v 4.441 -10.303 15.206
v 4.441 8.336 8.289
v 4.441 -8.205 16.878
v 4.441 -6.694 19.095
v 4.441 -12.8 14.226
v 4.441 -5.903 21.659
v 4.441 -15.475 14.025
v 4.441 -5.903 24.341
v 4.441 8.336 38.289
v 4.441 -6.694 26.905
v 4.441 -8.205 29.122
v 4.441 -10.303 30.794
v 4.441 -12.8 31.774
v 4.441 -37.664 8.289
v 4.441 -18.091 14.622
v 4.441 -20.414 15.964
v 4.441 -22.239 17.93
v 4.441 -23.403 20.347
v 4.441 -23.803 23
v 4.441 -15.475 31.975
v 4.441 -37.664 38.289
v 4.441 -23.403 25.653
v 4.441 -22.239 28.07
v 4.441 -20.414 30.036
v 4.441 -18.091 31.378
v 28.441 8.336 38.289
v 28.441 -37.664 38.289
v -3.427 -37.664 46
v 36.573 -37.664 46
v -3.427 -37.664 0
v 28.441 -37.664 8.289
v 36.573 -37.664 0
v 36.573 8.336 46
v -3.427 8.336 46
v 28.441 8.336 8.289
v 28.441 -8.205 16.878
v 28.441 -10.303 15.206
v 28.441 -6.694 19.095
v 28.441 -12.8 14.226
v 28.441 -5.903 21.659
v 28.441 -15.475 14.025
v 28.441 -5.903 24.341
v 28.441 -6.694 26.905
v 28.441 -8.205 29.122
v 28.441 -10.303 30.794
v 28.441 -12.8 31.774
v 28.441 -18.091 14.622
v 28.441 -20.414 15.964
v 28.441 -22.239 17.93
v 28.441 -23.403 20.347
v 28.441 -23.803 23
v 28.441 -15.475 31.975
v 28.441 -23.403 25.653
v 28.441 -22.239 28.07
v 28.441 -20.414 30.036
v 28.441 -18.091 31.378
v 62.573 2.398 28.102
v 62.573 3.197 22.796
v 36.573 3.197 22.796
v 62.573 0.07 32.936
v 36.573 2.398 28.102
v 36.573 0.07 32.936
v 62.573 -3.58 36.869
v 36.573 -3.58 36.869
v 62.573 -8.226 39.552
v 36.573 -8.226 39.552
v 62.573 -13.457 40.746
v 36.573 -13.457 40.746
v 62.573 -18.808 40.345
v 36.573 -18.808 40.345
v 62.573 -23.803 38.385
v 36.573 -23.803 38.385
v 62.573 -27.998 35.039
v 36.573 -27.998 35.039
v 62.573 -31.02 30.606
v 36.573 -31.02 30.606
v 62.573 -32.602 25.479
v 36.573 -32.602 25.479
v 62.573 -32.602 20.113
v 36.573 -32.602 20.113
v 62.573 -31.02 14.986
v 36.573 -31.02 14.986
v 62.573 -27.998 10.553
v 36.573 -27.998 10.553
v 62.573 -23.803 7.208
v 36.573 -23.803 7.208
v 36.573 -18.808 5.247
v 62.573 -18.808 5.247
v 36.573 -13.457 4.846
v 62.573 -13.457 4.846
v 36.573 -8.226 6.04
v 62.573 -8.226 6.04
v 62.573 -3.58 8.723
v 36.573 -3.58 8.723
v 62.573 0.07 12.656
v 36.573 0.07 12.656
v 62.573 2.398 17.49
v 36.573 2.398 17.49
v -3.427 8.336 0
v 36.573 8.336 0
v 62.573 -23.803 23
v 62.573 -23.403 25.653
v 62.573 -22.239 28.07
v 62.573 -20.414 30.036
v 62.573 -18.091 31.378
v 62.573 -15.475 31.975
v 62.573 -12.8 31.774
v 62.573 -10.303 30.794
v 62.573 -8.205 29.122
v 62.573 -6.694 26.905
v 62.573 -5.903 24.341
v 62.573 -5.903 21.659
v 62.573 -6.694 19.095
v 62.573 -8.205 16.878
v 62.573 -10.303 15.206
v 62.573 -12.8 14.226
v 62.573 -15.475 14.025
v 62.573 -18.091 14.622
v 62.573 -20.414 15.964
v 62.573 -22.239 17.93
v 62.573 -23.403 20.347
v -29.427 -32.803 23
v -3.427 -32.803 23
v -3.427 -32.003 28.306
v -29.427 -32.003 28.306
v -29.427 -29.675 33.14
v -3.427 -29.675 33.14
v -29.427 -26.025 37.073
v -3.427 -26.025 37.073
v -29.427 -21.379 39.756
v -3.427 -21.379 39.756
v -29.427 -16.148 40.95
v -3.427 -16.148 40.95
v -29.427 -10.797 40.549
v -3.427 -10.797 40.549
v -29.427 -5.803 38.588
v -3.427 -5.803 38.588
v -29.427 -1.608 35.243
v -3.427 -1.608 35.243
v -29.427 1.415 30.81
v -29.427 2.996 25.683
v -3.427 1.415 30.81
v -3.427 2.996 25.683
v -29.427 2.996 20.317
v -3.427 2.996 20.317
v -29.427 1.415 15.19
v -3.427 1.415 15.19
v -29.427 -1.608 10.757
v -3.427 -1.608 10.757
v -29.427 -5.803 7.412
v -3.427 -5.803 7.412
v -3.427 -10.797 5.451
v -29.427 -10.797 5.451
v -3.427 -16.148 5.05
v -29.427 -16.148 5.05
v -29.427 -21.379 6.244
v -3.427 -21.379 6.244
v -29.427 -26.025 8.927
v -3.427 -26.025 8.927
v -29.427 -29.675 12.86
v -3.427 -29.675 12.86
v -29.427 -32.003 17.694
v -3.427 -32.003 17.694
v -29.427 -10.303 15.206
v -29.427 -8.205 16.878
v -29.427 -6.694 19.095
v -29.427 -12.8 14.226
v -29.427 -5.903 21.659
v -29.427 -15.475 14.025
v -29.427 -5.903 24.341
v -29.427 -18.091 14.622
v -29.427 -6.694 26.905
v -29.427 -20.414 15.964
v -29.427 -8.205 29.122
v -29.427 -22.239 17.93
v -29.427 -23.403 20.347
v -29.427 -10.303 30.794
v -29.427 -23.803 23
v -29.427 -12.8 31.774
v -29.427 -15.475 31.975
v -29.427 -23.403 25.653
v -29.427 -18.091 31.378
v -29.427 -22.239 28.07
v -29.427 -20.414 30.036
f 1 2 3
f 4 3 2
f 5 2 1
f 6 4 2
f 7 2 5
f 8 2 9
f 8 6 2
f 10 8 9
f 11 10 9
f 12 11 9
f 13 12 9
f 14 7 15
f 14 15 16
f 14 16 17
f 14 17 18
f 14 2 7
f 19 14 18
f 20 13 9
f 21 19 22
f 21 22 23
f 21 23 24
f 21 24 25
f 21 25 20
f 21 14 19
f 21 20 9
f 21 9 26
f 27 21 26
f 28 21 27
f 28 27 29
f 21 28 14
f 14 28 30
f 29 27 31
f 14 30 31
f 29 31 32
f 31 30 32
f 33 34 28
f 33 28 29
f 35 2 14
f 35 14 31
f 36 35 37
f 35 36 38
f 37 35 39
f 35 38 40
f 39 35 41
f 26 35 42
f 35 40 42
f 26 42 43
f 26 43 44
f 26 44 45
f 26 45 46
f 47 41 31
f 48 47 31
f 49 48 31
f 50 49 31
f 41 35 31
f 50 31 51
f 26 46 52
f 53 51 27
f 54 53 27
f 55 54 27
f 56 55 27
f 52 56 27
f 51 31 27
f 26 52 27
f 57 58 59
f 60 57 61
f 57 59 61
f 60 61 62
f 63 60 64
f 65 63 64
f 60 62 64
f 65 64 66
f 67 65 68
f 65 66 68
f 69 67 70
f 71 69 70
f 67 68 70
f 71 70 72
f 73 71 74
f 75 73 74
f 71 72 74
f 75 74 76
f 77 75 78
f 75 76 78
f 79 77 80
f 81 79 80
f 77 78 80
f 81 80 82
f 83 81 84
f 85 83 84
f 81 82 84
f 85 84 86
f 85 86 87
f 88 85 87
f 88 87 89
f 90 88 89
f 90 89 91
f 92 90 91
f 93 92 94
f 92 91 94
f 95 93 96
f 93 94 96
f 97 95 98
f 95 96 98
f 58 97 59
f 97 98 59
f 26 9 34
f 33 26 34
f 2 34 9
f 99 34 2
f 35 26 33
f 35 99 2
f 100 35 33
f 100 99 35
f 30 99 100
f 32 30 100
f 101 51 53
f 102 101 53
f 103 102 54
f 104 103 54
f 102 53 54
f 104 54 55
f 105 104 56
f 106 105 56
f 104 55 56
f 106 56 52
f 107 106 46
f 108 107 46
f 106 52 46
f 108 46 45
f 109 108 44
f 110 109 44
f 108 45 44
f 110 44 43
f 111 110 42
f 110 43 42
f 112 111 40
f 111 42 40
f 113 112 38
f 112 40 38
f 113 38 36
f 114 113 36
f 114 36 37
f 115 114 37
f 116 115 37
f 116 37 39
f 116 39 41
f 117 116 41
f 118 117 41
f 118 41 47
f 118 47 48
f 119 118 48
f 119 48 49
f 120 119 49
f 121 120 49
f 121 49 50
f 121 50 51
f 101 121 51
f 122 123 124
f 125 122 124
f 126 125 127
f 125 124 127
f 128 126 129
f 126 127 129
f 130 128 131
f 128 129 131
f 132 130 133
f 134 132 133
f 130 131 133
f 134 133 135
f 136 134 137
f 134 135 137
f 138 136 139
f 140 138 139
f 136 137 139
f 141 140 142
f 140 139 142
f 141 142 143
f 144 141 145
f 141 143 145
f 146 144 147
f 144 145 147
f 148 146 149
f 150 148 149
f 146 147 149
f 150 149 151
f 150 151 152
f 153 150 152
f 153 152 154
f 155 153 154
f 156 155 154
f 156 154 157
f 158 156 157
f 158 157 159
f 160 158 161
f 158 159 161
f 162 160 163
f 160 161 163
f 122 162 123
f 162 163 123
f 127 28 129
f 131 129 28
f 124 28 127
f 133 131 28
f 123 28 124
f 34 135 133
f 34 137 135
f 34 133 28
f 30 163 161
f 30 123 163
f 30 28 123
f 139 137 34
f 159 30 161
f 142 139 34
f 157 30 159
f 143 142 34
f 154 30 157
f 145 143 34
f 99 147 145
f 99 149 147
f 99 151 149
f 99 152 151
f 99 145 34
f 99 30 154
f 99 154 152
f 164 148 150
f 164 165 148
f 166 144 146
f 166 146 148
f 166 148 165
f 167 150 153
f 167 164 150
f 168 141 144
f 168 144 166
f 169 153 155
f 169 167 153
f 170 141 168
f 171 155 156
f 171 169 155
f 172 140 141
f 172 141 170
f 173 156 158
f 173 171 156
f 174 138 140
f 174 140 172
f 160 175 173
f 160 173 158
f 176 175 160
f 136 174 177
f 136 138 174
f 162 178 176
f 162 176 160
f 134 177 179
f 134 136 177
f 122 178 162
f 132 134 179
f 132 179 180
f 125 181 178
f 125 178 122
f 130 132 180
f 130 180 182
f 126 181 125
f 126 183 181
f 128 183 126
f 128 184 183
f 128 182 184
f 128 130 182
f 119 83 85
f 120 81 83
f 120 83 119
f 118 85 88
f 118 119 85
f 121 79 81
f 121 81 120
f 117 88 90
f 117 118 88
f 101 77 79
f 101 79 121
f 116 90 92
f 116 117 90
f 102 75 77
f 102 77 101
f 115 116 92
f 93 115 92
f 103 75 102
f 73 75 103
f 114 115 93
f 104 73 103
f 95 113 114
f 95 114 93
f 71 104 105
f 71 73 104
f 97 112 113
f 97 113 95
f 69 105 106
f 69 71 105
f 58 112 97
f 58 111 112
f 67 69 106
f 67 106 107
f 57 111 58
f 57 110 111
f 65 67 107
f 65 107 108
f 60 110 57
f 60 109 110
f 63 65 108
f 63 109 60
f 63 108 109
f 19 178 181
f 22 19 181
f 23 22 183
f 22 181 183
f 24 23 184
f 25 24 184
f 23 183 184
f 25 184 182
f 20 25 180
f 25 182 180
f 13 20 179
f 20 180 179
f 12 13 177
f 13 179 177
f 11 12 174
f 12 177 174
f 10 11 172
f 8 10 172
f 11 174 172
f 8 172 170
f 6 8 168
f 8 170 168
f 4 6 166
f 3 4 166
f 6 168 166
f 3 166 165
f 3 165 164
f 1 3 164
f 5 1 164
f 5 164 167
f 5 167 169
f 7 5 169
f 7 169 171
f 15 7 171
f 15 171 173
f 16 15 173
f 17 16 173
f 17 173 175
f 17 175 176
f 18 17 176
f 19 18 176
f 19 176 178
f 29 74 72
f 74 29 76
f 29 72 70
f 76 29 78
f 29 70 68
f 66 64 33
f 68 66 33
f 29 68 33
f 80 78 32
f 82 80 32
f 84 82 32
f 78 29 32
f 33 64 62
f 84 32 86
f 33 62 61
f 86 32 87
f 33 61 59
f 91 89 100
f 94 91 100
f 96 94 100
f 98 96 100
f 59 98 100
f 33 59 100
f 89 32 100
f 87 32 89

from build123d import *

# Parameters (mm, degrees)
F0_W      = 40
F0_H      = 46
F1_DEPTH  = 46
F3_W      = 24
F3_H      = 30
F4_DEPTH  = 46
F5_R      = 18
F6_DEPTH  = 26
F7_R      = 18
F8_DEPTH  = 26
F9_R      = 9
F10_DEPTH = 92


with BuildPart() as f1:
    # F0 (on Top) → F1 (new body)
    with BuildSketch(Plane.XY):
        with Locations((16.572512, -14.664019)):
            Rectangle(F0_W, F0_H)
    extrude(amount=F1_DEPTH)

    # F3 (on face) → F4 (cut)
    with BuildSketch(Plane.XZ.offset(37.664019)):
        with Locations((16.440791, 23.289474)):
            Rectangle(F3_W, F3_H)
    extrude(amount=-F4_DEPTH, mode=Mode.SUBTRACT)

    # F5 (on face) → F6 (join)
    with BuildSketch(Plane.YZ.offset(36.572512)):
        with Locations((-14.802633, 22.796053)):
            Circle(F5_R)
    extrude(amount=F6_DEPTH)

    # F7 (on face) → F8 (join)
    with BuildSketch(Plane(origin=(-3.427488, 0, 0), x_dir=(0, -1, 0), z_dir=(-1, 0, 0))):
        with Locations((14.802634, 23)):
            Circle(F7_R)
    extrude(amount=F8_DEPTH)

    # F9 (on face) → F10 (cut)
    with BuildSketch(Plane(origin=(-29.427488, 0, 0), x_dir=(0, -1, 0), z_dir=(-1, 0, 0))):
        with Locations((14.802634, 23)):
            Circle(F9_R)
    extrude(amount=-F10_DEPTH, mode=Mode.SUBTRACT)


solid = f1.part
